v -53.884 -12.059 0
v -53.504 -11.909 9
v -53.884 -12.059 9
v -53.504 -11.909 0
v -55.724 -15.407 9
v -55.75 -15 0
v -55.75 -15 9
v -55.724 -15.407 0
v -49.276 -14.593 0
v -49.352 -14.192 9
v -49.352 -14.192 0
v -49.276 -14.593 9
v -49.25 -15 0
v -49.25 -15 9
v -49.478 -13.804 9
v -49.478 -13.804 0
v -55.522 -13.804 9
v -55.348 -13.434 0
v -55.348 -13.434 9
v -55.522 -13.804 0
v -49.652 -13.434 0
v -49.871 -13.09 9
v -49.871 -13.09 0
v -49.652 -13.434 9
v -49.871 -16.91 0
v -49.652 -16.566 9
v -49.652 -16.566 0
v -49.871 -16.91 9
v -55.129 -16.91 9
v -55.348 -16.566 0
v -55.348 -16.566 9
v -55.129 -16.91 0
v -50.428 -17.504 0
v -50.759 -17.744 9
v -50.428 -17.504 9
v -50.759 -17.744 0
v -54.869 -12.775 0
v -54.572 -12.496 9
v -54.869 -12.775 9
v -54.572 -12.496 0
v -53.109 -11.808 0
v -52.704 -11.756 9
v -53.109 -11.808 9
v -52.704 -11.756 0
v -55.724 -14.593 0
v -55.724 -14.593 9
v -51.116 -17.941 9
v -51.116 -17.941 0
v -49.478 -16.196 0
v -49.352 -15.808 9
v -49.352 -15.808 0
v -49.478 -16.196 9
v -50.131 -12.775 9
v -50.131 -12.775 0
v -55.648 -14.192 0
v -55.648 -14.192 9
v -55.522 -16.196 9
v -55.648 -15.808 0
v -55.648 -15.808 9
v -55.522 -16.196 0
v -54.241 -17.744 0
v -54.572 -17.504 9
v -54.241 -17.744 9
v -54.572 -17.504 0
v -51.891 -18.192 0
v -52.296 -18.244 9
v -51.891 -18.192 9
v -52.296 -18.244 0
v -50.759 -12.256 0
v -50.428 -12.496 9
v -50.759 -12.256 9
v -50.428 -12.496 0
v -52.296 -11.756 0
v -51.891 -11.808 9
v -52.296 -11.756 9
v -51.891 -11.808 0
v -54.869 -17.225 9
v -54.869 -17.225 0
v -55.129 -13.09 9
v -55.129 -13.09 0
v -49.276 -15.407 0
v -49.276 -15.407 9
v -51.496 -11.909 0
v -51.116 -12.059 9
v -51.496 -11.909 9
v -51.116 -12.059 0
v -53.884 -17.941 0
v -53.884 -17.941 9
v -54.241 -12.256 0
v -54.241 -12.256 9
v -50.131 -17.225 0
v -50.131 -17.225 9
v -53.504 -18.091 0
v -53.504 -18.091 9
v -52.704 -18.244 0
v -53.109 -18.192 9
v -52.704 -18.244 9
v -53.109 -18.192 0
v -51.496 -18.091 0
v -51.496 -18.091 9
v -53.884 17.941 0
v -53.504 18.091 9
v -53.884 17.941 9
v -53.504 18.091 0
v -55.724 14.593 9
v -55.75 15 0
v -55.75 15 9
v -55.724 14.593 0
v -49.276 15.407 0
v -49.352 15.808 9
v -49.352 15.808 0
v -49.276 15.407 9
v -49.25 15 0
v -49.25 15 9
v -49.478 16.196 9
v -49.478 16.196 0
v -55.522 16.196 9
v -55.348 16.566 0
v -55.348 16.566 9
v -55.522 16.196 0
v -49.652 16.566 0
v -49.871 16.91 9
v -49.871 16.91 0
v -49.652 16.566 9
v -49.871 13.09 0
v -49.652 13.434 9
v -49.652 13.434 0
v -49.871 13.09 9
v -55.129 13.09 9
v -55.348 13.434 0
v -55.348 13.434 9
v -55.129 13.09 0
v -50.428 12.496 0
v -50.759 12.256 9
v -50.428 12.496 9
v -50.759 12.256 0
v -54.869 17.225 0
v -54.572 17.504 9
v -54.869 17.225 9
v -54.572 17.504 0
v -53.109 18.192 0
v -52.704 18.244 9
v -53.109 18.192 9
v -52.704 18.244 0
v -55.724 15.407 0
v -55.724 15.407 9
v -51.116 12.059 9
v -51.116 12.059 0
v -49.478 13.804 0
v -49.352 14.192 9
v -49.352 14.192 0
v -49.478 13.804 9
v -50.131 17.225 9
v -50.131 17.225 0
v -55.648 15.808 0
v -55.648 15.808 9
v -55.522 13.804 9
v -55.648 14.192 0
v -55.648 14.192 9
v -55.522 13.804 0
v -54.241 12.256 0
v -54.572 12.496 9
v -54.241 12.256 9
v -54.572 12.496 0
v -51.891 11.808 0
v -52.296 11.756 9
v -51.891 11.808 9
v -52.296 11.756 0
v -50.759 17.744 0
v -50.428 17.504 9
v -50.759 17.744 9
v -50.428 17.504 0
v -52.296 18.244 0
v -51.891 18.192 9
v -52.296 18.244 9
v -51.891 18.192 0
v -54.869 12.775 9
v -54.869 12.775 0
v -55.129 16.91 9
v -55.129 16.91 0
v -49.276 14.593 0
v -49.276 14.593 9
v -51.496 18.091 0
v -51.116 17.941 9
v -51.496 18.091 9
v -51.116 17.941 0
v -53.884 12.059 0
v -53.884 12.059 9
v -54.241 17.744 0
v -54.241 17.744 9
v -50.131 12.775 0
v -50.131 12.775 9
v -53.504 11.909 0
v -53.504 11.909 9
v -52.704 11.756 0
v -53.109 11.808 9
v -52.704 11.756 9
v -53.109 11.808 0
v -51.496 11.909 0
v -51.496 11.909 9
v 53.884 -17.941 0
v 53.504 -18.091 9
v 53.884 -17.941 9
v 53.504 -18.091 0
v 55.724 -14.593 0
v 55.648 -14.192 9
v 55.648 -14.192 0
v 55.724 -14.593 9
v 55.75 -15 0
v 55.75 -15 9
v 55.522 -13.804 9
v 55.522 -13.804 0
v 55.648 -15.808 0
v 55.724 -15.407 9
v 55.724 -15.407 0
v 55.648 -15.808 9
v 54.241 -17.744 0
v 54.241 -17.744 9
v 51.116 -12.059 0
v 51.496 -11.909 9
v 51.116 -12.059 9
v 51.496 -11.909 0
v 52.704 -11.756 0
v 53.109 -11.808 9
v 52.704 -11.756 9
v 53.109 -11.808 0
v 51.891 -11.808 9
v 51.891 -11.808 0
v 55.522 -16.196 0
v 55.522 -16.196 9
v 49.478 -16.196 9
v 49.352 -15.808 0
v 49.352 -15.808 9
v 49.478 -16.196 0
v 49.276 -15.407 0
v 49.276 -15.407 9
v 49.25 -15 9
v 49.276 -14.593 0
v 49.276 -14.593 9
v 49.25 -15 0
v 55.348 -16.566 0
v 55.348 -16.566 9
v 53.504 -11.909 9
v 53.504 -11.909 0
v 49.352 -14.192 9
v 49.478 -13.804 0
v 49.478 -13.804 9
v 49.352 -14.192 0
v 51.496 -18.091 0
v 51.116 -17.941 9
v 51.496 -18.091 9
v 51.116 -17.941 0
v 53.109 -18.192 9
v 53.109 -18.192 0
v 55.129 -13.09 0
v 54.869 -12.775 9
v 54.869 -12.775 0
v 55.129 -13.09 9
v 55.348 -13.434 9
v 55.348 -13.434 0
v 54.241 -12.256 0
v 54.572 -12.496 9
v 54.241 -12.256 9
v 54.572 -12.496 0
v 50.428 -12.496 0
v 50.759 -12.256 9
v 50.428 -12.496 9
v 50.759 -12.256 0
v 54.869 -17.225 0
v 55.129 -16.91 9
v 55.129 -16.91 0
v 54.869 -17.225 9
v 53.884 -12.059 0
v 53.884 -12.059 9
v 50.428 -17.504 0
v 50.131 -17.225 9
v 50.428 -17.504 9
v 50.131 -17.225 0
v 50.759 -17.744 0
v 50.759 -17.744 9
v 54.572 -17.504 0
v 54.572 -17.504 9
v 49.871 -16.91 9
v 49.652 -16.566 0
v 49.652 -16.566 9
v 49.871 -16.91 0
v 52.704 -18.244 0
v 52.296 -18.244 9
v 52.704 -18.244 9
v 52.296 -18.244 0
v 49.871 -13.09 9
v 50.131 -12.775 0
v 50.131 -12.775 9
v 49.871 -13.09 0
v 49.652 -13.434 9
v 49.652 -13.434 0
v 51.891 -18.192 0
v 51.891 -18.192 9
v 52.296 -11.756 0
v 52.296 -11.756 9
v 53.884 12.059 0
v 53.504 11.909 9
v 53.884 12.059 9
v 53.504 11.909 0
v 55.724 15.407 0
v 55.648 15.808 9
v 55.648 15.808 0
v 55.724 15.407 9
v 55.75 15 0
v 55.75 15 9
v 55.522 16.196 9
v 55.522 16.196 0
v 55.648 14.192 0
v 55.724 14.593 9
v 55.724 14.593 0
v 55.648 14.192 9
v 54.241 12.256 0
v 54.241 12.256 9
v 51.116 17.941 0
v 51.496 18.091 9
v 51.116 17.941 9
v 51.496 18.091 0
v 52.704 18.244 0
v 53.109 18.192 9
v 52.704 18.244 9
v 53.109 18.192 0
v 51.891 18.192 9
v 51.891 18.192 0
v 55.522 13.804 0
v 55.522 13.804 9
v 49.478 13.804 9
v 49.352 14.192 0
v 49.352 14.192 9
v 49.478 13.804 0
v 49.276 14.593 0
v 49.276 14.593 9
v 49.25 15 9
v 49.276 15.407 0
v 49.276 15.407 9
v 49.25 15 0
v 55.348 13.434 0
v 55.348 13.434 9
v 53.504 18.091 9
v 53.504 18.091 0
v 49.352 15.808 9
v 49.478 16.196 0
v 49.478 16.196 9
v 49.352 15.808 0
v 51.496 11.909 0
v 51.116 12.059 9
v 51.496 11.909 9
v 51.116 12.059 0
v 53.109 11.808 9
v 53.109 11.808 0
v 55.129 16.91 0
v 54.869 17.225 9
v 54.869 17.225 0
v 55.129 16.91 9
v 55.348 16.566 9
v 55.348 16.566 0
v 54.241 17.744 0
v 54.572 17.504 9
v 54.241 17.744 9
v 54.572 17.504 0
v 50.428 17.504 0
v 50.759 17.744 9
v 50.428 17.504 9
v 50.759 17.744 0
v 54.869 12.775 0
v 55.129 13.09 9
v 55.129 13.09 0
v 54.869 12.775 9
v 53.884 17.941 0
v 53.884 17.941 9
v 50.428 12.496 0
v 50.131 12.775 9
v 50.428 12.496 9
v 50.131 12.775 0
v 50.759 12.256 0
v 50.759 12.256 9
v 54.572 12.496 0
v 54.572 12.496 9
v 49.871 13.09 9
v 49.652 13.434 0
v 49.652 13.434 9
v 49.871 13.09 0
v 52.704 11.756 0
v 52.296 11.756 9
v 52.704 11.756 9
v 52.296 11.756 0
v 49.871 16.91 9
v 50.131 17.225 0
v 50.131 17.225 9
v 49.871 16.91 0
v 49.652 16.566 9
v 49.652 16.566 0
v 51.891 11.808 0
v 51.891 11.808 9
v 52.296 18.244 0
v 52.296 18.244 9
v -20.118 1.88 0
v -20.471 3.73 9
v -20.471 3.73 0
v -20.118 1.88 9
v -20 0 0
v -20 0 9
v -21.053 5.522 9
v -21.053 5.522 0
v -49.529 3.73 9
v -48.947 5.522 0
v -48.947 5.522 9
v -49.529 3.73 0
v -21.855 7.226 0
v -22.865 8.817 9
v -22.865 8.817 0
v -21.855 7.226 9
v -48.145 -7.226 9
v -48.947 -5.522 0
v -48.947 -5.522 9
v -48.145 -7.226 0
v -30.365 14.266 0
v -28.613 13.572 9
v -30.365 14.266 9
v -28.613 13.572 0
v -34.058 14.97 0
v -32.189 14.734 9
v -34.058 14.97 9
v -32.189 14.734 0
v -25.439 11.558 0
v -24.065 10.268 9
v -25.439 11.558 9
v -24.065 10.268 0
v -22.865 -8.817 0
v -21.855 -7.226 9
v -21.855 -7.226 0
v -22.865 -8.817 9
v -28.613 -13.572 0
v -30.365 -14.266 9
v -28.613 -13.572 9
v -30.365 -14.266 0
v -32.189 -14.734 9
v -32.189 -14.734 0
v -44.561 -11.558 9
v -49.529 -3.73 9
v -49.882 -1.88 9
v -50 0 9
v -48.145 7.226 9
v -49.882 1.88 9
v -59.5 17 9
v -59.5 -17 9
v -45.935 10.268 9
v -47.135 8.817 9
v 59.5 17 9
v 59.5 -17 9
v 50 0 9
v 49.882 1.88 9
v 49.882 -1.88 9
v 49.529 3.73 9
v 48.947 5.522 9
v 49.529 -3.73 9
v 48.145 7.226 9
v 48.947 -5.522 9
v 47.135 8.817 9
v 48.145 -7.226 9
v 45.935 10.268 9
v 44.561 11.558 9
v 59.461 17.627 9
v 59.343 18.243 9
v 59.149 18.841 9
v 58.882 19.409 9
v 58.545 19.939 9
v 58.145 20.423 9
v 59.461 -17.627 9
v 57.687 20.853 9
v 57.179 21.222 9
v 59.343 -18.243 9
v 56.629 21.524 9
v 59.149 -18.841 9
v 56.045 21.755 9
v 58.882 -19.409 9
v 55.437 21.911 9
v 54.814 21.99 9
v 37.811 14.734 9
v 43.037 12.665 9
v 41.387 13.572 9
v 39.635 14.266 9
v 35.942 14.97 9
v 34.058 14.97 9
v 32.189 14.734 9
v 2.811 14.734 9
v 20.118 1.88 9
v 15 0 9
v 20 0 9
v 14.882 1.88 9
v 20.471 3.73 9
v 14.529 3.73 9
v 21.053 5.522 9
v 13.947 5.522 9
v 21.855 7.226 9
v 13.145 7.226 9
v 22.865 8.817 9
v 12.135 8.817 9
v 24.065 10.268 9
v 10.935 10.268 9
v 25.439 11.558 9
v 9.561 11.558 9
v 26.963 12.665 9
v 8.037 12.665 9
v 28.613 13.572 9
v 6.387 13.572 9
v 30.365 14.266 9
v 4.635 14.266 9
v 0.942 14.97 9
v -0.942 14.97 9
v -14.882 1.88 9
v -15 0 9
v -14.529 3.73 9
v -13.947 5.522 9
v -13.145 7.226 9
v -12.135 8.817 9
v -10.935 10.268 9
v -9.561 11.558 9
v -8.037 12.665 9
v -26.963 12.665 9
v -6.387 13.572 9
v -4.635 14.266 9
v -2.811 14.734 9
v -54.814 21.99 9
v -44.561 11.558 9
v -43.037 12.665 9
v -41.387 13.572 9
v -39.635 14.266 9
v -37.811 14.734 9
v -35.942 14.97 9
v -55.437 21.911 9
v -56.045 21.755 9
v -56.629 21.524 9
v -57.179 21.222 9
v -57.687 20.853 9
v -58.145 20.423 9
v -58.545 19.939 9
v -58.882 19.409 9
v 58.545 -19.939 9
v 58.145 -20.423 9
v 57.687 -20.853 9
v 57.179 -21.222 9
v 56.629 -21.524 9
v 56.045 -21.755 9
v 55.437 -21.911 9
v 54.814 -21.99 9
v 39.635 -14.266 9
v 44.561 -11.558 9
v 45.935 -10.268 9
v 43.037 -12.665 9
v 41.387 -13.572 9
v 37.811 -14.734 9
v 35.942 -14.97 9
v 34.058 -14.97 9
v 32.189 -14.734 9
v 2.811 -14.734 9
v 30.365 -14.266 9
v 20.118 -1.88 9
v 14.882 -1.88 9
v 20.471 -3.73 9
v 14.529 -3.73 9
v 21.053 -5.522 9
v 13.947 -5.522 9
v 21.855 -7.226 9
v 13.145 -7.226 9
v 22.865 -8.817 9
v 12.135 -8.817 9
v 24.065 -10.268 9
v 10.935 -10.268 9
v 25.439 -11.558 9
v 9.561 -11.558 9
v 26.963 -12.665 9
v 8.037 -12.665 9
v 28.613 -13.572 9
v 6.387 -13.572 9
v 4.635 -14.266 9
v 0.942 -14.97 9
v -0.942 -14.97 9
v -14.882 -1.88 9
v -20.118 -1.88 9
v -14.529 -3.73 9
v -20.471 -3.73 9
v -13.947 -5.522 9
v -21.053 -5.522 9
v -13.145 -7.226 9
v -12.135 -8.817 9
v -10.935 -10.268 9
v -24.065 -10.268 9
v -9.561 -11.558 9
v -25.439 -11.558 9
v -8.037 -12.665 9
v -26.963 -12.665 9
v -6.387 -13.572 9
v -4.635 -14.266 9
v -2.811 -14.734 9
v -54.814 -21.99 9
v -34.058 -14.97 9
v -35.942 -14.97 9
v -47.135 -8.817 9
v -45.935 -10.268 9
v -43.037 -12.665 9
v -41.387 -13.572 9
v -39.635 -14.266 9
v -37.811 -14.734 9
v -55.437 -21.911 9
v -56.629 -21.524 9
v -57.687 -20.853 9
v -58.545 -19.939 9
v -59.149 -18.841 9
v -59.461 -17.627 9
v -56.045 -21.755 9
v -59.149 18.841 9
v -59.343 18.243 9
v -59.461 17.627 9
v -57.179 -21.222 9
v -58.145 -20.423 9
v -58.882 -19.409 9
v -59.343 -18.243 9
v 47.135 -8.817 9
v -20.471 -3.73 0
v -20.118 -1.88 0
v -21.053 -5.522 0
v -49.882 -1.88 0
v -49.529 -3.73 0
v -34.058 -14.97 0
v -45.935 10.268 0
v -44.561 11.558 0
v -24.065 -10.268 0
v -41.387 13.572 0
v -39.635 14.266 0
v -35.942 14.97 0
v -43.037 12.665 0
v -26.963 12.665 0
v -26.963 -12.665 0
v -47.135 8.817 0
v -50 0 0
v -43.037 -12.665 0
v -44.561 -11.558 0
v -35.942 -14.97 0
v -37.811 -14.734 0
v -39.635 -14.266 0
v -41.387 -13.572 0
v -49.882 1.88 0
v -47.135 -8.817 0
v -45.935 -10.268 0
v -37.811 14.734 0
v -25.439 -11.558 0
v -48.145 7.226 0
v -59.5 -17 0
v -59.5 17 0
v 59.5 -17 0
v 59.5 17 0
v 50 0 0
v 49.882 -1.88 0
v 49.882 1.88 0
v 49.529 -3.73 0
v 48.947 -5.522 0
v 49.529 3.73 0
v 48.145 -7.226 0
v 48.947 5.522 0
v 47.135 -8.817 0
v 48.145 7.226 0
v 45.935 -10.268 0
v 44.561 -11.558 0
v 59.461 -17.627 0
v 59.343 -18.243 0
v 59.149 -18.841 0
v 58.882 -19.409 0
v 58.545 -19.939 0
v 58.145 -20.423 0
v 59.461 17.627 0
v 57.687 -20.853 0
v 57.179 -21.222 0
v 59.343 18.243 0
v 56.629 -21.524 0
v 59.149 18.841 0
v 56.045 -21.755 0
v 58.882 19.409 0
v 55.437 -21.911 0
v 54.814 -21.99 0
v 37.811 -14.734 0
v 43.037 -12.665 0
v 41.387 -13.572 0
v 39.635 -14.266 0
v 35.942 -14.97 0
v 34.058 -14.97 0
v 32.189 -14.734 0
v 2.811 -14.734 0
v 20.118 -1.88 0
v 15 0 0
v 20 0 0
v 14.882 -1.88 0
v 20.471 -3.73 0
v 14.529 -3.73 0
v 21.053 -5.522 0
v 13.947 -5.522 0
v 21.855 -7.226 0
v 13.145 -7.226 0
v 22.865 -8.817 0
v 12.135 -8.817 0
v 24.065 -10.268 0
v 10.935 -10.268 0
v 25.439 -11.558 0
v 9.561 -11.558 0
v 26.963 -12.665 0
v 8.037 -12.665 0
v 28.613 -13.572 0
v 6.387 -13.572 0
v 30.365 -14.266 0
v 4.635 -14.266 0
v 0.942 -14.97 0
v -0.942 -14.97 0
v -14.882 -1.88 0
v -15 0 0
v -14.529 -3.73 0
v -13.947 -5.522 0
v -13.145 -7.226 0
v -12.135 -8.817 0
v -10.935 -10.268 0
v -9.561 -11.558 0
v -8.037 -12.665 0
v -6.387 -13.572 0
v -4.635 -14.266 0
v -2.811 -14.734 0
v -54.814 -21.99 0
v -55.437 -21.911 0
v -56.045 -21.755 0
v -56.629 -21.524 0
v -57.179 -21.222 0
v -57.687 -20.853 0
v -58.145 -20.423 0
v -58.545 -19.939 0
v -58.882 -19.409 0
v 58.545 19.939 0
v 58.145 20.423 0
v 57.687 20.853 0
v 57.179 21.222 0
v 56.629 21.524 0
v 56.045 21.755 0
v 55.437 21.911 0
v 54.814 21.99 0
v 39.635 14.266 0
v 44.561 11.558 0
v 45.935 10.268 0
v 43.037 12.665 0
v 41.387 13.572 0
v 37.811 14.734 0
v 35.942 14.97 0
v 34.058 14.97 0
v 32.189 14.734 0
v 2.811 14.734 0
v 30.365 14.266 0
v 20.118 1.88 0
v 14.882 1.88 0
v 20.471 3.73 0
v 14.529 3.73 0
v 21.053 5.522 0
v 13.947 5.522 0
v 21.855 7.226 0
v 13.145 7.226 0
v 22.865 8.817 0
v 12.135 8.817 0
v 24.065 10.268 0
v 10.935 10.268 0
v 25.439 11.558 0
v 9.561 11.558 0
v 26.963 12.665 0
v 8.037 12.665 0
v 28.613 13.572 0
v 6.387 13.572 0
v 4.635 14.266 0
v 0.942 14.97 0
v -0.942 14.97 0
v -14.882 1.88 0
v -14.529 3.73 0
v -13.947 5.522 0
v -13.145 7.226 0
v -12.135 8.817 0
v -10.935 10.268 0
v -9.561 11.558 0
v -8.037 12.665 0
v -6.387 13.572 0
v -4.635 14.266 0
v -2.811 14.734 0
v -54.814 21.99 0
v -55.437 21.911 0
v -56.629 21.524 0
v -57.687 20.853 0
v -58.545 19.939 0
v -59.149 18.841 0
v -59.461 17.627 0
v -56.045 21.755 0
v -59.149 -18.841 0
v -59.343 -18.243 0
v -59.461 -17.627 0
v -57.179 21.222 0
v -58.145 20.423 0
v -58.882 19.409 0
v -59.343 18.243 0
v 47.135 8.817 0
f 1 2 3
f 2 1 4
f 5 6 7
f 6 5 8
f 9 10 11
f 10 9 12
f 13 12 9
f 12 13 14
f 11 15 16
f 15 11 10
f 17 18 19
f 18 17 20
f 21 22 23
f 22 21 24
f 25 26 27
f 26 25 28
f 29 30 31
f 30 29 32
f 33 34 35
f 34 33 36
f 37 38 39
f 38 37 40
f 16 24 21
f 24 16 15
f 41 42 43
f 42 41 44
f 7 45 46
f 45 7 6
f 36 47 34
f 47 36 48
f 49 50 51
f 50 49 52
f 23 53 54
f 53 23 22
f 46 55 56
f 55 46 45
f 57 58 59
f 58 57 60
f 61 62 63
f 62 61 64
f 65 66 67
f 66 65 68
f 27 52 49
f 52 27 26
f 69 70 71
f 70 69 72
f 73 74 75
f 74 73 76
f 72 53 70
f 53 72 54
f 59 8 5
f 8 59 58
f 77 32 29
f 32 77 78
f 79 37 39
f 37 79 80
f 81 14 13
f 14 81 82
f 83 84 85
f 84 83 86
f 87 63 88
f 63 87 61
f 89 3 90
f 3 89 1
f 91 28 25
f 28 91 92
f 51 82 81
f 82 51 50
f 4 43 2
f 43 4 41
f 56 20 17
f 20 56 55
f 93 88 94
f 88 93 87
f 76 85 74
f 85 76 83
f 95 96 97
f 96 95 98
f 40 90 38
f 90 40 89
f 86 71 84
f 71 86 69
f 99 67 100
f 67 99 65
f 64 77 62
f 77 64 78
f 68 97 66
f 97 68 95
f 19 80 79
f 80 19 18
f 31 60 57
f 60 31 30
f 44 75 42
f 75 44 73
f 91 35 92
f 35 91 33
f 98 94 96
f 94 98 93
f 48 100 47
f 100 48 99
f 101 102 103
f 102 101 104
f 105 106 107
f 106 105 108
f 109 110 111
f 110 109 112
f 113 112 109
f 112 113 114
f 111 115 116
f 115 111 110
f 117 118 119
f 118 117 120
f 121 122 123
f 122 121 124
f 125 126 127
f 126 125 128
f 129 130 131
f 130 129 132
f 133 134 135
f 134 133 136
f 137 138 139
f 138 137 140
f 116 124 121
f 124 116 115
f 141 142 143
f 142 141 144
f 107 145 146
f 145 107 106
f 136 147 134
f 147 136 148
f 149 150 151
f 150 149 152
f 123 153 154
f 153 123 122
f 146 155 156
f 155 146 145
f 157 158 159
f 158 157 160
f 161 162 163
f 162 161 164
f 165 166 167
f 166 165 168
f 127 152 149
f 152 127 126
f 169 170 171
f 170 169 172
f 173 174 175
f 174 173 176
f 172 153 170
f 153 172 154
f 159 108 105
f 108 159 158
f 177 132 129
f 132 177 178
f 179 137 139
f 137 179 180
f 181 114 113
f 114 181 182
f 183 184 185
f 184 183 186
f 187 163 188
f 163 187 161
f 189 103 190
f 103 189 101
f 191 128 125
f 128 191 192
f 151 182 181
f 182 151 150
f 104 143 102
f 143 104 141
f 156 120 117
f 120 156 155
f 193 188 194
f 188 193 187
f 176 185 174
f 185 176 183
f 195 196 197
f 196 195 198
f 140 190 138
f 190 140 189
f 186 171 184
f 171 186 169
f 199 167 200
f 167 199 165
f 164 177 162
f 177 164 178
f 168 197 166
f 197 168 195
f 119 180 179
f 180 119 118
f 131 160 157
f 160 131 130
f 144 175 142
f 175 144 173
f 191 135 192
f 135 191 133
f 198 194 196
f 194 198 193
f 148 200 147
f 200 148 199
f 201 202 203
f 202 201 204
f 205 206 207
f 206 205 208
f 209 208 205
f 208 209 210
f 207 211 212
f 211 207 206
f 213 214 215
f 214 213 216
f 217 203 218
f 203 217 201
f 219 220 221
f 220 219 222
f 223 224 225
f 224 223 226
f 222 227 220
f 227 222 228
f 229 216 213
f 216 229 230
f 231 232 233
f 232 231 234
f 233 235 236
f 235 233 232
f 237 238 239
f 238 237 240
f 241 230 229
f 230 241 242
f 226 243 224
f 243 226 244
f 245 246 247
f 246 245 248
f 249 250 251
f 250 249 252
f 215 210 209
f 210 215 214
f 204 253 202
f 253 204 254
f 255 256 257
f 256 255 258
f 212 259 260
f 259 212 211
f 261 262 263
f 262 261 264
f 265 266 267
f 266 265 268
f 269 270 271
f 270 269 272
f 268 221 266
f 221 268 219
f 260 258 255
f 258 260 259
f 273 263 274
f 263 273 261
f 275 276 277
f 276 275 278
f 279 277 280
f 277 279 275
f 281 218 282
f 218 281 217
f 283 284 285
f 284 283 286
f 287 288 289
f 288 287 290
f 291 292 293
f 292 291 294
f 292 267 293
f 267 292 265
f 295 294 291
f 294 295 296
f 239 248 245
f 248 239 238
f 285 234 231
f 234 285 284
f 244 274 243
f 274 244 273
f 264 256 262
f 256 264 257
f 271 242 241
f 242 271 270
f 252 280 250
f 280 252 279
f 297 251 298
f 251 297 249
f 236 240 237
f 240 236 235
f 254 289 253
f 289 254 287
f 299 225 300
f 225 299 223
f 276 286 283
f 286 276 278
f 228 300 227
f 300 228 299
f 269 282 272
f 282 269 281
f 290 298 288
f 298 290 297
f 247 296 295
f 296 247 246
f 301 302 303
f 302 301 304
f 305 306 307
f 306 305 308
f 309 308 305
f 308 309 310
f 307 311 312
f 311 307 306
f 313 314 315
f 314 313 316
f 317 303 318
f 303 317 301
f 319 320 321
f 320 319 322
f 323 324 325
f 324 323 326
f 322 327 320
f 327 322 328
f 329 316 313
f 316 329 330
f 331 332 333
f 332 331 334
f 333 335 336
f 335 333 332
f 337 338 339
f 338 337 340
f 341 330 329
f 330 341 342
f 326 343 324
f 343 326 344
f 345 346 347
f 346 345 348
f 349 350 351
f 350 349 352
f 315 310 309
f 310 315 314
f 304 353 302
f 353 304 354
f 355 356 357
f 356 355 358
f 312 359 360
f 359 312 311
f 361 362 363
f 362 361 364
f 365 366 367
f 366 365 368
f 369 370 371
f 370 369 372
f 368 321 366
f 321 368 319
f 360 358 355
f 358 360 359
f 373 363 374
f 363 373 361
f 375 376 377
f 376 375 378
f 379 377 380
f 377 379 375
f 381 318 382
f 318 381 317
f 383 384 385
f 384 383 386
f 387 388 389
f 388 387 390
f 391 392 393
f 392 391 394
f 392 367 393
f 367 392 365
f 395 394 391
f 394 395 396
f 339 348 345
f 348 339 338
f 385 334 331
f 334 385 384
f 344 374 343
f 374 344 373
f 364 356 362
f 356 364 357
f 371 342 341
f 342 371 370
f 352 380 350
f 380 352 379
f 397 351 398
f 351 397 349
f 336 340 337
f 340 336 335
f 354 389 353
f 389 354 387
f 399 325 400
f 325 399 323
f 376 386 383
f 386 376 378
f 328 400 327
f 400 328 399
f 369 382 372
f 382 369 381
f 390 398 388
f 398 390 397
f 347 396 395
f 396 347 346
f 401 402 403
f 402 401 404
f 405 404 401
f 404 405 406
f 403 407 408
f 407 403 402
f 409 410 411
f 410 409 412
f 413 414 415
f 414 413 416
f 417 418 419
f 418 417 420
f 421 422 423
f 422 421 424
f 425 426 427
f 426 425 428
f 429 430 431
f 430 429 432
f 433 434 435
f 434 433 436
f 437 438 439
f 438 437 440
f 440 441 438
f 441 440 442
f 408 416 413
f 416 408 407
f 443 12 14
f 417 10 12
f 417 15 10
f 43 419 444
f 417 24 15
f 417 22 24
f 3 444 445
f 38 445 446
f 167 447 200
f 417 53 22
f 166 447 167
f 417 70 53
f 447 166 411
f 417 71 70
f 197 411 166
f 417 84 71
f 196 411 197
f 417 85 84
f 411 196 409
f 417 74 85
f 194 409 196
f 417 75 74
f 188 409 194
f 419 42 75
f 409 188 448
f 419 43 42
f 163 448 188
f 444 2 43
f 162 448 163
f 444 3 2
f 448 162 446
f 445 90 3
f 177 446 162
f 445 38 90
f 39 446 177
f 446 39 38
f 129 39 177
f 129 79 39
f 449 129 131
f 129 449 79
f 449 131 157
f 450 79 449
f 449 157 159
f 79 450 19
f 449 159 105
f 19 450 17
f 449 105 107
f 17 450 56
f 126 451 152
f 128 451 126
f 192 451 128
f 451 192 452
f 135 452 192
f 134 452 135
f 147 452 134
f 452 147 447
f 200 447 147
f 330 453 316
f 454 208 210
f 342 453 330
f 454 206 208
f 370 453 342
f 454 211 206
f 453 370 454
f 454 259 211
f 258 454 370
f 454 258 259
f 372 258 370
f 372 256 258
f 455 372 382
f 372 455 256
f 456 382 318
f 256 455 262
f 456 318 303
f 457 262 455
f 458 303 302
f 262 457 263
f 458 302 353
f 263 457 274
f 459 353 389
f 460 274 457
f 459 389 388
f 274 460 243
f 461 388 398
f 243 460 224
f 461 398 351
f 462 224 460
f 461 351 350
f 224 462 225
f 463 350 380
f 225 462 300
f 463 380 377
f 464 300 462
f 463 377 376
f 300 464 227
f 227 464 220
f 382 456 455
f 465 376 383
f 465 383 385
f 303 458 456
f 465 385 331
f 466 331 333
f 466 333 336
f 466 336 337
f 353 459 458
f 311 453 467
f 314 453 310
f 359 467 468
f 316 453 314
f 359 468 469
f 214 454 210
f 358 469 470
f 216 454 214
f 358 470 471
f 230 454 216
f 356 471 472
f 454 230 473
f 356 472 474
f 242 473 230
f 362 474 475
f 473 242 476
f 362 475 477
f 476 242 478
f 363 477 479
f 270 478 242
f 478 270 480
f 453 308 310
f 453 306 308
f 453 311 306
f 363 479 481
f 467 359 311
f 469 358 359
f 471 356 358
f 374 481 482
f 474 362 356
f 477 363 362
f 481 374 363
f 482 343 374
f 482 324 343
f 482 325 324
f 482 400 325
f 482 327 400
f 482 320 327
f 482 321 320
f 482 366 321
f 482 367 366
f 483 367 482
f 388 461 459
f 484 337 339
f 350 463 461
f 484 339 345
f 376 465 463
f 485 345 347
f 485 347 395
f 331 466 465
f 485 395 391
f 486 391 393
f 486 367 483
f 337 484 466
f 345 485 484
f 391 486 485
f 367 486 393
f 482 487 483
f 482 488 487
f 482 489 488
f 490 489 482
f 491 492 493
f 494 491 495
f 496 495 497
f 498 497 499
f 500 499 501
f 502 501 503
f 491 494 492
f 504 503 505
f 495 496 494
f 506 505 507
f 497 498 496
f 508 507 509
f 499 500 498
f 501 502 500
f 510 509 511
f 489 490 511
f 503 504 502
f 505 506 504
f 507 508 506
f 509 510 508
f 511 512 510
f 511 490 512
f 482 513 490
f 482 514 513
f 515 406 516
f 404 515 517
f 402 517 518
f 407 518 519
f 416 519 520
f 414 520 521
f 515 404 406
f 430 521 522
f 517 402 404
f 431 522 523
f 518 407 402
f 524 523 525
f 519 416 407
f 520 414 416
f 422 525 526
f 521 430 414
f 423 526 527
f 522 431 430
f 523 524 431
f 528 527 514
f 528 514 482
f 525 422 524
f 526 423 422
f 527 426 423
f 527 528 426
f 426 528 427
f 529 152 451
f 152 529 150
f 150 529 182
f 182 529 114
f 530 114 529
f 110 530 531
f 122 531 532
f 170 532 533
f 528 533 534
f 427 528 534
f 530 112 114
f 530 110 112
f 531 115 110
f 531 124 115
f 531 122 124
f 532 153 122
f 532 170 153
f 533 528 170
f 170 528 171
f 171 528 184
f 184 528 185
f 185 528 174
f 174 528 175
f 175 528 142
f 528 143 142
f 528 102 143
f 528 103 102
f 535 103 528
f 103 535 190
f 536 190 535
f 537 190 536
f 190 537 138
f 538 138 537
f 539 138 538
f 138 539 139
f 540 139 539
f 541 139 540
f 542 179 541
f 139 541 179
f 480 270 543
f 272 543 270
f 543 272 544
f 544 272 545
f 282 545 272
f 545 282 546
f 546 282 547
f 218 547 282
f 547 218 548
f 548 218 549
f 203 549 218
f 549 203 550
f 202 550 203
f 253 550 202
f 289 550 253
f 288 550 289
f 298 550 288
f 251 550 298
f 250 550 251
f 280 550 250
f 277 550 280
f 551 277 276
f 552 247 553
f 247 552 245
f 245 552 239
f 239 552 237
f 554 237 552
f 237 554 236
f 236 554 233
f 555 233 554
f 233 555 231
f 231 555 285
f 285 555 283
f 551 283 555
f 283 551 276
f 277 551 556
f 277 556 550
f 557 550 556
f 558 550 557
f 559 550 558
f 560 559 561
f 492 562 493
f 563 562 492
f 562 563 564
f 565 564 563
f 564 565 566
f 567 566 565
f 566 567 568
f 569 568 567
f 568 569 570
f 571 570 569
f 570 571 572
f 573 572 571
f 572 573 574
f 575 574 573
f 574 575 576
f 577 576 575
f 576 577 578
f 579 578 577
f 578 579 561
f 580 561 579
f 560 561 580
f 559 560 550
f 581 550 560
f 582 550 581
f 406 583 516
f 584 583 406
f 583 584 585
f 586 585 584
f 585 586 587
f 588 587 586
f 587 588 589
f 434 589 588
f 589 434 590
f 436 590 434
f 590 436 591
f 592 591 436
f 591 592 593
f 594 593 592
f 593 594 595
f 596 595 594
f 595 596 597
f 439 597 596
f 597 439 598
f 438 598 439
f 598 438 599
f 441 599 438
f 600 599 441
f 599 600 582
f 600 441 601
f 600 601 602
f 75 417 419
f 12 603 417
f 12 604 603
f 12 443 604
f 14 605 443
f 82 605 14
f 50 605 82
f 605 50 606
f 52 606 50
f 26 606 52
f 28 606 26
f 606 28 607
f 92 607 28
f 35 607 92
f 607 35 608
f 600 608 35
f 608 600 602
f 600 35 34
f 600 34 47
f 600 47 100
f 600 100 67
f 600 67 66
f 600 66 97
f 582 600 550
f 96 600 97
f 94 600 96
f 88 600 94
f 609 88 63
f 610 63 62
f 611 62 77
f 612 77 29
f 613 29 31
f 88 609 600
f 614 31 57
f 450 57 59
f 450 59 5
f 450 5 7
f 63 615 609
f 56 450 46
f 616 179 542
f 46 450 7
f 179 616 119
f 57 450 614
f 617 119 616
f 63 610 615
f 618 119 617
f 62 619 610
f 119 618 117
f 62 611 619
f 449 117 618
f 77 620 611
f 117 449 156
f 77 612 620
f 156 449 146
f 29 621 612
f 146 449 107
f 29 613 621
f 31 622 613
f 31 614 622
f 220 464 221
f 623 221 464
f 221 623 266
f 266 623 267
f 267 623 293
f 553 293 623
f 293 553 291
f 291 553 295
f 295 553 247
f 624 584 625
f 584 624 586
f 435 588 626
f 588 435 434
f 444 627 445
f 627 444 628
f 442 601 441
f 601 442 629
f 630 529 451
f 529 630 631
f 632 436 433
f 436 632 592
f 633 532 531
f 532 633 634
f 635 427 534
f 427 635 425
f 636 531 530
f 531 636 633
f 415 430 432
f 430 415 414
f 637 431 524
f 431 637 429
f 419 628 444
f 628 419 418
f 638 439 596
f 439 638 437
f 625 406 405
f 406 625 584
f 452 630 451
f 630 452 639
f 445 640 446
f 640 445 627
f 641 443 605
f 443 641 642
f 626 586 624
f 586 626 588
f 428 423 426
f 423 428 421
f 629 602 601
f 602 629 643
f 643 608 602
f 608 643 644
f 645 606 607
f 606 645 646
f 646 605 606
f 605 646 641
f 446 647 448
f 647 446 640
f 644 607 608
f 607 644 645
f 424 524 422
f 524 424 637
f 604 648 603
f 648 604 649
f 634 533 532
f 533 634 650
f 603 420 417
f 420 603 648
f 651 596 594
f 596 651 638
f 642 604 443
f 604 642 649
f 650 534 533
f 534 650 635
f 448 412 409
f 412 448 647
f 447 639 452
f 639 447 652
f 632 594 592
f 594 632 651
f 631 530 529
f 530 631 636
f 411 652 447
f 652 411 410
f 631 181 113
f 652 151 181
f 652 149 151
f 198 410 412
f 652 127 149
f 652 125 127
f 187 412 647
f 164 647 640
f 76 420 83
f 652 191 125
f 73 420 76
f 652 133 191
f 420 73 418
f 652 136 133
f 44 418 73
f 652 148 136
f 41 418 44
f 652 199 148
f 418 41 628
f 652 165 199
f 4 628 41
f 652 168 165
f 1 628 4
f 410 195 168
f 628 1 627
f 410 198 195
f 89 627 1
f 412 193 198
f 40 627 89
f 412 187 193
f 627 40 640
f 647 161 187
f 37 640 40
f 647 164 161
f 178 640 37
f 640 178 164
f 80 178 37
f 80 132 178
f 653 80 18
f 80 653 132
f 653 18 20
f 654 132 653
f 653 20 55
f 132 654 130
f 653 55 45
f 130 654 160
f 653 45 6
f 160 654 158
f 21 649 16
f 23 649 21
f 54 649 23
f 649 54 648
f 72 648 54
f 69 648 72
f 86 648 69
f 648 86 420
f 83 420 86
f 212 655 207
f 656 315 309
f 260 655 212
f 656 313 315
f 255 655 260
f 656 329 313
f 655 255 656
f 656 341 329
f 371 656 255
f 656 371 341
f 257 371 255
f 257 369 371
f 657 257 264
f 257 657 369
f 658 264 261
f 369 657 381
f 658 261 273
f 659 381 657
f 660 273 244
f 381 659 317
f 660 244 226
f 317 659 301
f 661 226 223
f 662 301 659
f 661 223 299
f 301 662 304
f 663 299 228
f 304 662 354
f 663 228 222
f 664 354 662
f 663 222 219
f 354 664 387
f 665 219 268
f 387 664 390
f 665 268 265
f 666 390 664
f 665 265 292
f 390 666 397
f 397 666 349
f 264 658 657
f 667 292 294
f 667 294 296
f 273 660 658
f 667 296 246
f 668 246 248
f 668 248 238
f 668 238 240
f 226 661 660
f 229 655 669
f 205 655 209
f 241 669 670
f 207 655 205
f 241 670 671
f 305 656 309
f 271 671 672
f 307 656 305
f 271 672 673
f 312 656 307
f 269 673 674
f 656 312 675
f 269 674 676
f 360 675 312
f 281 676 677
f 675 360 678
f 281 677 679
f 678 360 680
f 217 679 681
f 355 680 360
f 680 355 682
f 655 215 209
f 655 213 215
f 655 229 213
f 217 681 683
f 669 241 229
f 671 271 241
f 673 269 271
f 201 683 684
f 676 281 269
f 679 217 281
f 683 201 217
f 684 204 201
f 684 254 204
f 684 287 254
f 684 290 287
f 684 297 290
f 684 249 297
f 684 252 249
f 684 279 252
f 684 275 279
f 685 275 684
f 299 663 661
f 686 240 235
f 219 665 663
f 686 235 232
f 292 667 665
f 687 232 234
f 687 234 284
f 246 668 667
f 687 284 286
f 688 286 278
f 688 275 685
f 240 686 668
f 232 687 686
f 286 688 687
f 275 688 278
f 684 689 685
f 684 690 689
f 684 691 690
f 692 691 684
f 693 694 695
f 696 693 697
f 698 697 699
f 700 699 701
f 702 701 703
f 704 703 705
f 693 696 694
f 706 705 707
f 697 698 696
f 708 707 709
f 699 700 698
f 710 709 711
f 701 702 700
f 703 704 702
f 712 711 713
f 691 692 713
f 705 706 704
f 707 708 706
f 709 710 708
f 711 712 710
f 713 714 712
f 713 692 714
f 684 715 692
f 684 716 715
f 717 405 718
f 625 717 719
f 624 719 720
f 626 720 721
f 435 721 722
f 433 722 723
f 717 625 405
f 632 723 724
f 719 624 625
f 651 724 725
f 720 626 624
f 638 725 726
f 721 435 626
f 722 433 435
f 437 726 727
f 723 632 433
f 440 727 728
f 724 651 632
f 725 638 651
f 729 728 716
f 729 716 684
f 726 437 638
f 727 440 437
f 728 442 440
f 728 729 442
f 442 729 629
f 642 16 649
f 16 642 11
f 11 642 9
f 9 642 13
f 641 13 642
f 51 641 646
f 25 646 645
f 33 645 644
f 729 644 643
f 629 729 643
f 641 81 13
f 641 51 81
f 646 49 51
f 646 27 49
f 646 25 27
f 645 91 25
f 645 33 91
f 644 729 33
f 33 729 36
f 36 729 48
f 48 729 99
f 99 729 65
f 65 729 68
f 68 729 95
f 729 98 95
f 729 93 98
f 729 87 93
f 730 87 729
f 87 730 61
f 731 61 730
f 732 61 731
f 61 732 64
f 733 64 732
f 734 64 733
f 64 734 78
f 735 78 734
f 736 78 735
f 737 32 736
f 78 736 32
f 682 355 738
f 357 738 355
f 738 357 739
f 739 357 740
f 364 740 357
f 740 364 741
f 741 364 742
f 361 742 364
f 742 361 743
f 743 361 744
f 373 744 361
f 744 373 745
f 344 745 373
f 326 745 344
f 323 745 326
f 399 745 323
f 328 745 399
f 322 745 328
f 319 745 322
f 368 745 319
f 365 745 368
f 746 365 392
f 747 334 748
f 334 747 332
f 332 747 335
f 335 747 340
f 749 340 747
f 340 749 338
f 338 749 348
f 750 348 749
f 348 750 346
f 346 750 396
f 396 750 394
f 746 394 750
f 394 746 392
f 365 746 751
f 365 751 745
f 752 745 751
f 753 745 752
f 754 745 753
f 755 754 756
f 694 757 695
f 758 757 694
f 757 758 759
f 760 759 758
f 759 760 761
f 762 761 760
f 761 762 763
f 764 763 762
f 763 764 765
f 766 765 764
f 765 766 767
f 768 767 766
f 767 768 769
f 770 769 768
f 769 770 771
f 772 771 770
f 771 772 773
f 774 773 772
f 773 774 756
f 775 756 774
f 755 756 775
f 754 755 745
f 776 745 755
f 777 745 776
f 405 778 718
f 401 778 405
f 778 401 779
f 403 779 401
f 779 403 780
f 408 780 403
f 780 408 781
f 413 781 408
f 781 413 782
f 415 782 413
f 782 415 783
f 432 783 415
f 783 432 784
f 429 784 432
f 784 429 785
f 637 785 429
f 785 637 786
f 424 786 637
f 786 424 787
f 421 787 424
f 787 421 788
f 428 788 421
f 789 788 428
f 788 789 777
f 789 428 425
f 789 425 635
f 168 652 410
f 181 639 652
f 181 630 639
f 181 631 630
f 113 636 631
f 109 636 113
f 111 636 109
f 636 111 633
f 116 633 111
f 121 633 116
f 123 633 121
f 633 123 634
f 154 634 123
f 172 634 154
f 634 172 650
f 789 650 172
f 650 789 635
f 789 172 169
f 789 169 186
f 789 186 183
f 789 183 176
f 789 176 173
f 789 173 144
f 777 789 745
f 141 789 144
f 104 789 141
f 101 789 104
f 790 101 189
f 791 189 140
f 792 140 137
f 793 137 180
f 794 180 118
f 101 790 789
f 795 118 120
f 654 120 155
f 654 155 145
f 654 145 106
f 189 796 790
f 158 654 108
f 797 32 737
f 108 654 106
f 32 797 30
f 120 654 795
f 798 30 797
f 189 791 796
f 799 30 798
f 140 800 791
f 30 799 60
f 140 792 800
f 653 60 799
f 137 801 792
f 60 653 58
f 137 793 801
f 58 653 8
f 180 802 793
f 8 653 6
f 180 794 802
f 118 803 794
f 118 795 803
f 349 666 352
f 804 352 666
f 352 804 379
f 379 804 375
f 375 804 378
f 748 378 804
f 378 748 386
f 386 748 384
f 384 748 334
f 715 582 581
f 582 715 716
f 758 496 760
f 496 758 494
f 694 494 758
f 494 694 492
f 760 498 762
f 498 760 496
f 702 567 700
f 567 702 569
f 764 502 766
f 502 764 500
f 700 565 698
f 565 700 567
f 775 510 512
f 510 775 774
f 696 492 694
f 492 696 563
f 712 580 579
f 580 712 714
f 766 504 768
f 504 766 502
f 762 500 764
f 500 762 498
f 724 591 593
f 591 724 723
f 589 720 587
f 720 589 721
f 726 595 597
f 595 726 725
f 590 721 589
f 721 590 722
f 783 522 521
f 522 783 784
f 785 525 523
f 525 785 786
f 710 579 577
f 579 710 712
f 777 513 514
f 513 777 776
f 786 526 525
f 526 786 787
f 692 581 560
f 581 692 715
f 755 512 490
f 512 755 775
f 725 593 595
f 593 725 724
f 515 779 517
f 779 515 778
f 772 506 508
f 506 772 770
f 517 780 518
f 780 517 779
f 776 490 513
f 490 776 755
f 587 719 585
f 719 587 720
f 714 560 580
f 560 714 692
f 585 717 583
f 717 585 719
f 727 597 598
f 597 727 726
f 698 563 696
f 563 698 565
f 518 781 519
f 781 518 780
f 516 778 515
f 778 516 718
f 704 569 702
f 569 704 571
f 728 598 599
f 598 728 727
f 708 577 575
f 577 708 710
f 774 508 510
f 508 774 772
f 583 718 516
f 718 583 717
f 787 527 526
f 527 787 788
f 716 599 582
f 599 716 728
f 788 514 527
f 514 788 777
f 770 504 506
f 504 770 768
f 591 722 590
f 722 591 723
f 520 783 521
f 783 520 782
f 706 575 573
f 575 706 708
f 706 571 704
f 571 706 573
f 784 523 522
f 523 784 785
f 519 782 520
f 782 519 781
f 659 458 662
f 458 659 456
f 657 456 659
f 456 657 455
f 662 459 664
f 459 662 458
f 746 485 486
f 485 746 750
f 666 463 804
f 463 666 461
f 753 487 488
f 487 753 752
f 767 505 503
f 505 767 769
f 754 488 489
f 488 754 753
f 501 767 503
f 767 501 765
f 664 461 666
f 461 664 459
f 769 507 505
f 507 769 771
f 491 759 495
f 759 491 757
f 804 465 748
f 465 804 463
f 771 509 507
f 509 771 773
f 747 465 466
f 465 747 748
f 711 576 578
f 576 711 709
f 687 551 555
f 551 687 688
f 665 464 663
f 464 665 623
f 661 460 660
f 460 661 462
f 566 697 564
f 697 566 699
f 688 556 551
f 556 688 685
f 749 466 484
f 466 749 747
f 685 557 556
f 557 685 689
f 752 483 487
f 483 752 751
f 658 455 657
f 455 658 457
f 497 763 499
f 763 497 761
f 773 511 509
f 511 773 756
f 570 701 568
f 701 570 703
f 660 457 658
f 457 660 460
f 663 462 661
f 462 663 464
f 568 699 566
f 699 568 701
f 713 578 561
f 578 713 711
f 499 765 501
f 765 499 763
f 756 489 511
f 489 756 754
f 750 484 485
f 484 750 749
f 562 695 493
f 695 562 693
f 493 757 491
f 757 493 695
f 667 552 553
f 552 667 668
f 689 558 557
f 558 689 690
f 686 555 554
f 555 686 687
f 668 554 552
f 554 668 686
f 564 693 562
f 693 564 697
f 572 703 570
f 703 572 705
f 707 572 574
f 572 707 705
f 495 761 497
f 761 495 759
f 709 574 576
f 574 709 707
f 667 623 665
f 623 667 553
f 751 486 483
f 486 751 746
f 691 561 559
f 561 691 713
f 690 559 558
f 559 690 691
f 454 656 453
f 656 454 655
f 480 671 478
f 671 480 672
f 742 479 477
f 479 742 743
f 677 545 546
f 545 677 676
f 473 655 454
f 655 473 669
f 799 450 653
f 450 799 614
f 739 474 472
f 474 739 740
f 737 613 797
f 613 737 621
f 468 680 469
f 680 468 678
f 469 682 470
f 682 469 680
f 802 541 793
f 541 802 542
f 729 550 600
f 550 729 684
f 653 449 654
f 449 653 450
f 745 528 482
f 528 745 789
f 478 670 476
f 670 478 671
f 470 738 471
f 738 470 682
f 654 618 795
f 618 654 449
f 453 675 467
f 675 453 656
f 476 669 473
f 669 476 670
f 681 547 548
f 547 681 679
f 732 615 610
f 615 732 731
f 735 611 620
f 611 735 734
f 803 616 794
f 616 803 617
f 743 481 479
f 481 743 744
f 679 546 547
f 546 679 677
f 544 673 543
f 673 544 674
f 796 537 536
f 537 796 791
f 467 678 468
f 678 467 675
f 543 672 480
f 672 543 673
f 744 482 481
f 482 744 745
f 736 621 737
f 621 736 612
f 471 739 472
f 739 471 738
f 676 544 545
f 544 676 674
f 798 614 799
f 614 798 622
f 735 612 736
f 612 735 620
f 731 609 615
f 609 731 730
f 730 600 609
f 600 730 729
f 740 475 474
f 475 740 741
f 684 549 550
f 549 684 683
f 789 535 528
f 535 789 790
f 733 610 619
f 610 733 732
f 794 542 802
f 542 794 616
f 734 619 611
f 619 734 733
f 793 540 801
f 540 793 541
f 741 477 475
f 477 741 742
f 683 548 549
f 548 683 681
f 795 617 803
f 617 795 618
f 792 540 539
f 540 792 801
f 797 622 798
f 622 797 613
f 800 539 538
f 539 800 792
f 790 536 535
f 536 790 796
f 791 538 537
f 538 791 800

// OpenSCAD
$fn = 50;


difference() {
	union() {
		hull() {
			translate(v = [-54.5000000000, 17.0000000000, 0]) {
				cylinder(h = 9, r = 5);
			}
			translate(v = [54.5000000000, 17.0000000000, 0]) {
				cylinder(h = 9, r = 5);
			}
			translate(v = [-54.5000000000, -17.0000000000, 0]) {
				cylinder(h = 9, r = 5);
			}
			translate(v = [54.5000000000, -17.0000000000, 0]) {
				cylinder(h = 9, r = 5);
			}
		}
	}
	union() {
		#translate(v = [-52.5000000000, -15.0000000000, -100.0000000000]) {
			cylinder(h = 200, r = 3.2500000000);
		}
		#translate(v = [-52.5000000000, 15.0000000000, -100.0000000000]) {
			cylinder(h = 200, r = 3.2500000000);
		}
		#translate(v = [52.5000000000, -15.0000000000, -100.0000000000]) {
			cylinder(h = 200, r = 3.2500000000);
		}
		#translate(v = [52.5000000000, 15.0000000000, -100.0000000000]) {
			cylinder(h = 200, r = 3.2500000000);
		}
		#translate(v = [-35.0000000000, 0, 0]) {
			cylinder(h = 9, r = 15.0000000000);
		}
		#cylinder(h = 9, r = 15.0000000000);
		#translate(v = [35.0000000000, 0, 0]) {
			cylinder(h = 9, r = 15.0000000000);
		}
	}
}
